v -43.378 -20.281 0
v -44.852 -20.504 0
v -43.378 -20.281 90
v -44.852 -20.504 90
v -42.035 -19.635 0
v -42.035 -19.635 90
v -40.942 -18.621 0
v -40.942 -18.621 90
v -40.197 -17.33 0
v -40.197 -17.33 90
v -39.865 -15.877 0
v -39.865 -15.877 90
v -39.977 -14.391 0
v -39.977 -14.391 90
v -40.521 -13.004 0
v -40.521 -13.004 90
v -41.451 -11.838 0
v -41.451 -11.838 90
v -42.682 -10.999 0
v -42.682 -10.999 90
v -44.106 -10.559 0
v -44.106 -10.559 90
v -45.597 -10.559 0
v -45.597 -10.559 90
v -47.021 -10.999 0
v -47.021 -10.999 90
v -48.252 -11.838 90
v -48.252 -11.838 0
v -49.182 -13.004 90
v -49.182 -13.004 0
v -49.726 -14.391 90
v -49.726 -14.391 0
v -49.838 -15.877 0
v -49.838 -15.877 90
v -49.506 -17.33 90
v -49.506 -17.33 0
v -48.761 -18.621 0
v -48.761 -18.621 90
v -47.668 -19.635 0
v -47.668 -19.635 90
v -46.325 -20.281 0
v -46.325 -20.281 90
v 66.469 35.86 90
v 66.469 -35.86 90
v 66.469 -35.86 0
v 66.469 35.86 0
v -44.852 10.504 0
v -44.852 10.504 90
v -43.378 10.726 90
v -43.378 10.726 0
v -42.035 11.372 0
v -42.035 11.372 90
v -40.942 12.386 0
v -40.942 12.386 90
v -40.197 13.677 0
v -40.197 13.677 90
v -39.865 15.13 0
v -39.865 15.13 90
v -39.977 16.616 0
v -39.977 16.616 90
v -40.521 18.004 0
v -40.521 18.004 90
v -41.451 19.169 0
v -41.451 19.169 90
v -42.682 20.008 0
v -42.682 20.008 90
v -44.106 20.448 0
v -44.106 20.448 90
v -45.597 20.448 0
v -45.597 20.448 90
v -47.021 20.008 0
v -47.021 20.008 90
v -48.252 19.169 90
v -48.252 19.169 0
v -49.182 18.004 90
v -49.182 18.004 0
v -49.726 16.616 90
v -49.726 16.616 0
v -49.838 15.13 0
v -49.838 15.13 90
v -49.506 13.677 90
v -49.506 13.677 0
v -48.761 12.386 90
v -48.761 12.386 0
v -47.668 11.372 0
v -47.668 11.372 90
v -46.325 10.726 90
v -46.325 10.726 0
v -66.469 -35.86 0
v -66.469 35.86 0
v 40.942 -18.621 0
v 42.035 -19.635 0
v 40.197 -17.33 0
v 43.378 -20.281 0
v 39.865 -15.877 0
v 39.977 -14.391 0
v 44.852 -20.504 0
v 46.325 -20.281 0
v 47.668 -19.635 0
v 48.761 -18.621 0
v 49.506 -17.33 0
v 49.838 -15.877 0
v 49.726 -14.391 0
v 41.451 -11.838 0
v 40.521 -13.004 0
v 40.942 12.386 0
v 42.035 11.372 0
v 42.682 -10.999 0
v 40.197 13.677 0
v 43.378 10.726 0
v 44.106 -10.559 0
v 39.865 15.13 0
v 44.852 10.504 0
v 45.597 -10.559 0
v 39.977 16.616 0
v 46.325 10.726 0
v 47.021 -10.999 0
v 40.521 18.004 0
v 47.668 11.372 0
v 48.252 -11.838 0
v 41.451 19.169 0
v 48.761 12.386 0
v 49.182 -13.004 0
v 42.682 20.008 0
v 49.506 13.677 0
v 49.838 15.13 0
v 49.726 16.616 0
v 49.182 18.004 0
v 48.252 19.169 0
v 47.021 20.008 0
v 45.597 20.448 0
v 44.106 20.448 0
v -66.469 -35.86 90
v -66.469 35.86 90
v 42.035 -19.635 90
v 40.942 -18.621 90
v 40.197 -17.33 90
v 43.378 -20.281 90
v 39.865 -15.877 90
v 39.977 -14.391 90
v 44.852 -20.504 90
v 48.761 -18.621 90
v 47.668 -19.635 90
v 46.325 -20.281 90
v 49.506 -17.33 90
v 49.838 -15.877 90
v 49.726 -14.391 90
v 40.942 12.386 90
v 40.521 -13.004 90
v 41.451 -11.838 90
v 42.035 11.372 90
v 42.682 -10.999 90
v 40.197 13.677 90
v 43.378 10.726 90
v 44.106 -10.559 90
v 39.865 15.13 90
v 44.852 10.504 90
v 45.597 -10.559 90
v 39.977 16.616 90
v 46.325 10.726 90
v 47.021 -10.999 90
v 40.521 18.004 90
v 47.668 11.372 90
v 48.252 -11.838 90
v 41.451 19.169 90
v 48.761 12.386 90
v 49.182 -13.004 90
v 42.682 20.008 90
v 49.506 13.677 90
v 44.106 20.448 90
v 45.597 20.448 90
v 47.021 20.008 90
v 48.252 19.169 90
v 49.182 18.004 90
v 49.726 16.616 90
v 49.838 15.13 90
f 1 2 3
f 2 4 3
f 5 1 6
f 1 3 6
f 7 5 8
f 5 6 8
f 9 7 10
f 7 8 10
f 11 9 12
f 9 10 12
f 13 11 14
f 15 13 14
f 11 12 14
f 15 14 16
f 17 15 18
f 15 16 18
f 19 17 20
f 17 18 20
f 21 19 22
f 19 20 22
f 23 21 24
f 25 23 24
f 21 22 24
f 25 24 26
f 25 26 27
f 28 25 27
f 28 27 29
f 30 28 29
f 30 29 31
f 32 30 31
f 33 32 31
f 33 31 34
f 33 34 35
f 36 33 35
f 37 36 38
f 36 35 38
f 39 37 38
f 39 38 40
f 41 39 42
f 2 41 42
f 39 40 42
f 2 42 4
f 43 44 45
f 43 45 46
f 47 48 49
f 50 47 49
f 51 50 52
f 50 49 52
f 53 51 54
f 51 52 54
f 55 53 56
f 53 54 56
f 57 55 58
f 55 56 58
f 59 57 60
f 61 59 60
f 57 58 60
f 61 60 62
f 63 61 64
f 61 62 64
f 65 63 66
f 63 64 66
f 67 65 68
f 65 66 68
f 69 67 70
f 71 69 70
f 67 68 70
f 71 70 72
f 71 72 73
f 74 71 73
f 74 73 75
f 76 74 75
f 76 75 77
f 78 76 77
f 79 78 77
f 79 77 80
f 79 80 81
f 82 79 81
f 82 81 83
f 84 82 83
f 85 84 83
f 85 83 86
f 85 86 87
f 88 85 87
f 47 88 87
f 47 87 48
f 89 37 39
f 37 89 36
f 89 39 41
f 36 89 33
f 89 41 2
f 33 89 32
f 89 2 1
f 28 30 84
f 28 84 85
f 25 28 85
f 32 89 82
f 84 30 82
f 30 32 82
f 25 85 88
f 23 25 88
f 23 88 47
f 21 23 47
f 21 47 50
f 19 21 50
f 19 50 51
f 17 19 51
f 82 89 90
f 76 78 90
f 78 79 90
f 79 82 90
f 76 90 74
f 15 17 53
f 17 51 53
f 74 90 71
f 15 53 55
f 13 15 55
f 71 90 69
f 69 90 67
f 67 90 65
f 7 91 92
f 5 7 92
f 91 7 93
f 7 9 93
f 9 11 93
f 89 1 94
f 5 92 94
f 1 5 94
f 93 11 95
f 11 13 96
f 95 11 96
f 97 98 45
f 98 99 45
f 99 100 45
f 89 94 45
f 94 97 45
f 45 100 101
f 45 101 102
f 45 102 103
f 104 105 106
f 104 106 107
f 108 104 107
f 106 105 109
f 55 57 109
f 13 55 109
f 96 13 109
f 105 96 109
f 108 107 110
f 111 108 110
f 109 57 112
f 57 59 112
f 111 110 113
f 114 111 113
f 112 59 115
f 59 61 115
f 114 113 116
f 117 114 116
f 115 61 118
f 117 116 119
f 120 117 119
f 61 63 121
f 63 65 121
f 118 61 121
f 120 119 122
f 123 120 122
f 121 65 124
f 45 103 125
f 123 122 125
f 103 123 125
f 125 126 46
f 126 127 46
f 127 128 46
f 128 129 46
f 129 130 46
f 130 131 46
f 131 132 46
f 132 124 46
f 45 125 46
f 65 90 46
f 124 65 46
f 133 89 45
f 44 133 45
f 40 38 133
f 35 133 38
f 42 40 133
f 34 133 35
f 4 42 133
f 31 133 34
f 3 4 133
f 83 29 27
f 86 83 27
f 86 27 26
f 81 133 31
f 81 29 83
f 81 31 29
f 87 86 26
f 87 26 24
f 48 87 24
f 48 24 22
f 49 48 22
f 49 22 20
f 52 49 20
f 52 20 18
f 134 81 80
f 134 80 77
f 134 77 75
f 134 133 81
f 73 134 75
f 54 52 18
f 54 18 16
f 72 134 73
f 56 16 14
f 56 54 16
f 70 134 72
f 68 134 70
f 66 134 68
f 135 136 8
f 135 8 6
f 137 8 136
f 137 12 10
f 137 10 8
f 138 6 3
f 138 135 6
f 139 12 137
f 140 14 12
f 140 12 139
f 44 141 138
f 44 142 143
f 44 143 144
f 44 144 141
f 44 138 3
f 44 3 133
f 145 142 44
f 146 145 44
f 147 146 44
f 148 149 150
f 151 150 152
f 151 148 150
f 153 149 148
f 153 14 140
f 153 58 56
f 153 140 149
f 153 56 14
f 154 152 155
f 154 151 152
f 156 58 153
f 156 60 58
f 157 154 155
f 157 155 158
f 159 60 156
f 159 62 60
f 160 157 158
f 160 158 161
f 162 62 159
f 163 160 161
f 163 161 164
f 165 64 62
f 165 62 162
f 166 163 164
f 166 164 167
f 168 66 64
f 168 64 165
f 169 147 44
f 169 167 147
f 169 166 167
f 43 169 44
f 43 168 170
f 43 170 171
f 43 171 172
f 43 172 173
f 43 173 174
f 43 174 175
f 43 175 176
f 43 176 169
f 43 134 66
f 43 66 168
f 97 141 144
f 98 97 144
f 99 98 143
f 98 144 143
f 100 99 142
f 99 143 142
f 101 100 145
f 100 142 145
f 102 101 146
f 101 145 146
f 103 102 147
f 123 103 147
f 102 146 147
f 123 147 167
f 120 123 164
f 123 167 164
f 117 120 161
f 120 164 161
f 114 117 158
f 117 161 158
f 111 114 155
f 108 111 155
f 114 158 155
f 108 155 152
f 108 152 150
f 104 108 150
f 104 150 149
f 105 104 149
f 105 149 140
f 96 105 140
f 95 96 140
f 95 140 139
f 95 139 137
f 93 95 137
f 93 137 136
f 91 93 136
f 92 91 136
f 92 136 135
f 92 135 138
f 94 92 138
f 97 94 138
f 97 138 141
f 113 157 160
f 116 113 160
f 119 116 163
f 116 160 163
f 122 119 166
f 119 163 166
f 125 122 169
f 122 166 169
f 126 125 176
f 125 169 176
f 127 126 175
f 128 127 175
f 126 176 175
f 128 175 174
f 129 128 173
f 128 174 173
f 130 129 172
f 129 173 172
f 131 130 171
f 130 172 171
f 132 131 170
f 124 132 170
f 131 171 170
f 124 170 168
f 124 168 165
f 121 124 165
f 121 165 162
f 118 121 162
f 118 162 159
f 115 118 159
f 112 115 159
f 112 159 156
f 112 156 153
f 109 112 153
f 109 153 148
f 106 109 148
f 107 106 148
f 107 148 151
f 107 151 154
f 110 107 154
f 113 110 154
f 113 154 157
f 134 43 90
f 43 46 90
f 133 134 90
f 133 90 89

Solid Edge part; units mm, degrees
sketch "Sketch1" plane through (0, 0, 0) normal (0, 0, 1) x (1, 0, 0)
  line L0 (66.4689, 35.8597) -> (-66.4689, 35.8597)
  line L1 (-66.4689, 35.8597) -> (-66.4689, -35.8597)
  line L2 (-66.4689, -35.8597) -> (66.4689, -35.8597)
  line L3 (66.4689, -35.8597) -> (66.4689, 35.8597)
extrude "Protrusion1" add sketch "Sketch1" along normal blind 90
hole "Hole_1" at (-44.8515, -15.5036, 90) direction (0, 0, -1) diameter 10 end up to next
hole "Hole1" at (44.8515, -15.5036, 90) direction (0, 0, -1) diameter 10 end up to next
hole "Hole2" at (44.8515, 15.5036, 90) direction (0, 0, -1) diameter 10 end up to next
hole "Hole3" at (-44.8515, 15.5036, 90) direction (0, 0, -1) diameter 10 end up to next
